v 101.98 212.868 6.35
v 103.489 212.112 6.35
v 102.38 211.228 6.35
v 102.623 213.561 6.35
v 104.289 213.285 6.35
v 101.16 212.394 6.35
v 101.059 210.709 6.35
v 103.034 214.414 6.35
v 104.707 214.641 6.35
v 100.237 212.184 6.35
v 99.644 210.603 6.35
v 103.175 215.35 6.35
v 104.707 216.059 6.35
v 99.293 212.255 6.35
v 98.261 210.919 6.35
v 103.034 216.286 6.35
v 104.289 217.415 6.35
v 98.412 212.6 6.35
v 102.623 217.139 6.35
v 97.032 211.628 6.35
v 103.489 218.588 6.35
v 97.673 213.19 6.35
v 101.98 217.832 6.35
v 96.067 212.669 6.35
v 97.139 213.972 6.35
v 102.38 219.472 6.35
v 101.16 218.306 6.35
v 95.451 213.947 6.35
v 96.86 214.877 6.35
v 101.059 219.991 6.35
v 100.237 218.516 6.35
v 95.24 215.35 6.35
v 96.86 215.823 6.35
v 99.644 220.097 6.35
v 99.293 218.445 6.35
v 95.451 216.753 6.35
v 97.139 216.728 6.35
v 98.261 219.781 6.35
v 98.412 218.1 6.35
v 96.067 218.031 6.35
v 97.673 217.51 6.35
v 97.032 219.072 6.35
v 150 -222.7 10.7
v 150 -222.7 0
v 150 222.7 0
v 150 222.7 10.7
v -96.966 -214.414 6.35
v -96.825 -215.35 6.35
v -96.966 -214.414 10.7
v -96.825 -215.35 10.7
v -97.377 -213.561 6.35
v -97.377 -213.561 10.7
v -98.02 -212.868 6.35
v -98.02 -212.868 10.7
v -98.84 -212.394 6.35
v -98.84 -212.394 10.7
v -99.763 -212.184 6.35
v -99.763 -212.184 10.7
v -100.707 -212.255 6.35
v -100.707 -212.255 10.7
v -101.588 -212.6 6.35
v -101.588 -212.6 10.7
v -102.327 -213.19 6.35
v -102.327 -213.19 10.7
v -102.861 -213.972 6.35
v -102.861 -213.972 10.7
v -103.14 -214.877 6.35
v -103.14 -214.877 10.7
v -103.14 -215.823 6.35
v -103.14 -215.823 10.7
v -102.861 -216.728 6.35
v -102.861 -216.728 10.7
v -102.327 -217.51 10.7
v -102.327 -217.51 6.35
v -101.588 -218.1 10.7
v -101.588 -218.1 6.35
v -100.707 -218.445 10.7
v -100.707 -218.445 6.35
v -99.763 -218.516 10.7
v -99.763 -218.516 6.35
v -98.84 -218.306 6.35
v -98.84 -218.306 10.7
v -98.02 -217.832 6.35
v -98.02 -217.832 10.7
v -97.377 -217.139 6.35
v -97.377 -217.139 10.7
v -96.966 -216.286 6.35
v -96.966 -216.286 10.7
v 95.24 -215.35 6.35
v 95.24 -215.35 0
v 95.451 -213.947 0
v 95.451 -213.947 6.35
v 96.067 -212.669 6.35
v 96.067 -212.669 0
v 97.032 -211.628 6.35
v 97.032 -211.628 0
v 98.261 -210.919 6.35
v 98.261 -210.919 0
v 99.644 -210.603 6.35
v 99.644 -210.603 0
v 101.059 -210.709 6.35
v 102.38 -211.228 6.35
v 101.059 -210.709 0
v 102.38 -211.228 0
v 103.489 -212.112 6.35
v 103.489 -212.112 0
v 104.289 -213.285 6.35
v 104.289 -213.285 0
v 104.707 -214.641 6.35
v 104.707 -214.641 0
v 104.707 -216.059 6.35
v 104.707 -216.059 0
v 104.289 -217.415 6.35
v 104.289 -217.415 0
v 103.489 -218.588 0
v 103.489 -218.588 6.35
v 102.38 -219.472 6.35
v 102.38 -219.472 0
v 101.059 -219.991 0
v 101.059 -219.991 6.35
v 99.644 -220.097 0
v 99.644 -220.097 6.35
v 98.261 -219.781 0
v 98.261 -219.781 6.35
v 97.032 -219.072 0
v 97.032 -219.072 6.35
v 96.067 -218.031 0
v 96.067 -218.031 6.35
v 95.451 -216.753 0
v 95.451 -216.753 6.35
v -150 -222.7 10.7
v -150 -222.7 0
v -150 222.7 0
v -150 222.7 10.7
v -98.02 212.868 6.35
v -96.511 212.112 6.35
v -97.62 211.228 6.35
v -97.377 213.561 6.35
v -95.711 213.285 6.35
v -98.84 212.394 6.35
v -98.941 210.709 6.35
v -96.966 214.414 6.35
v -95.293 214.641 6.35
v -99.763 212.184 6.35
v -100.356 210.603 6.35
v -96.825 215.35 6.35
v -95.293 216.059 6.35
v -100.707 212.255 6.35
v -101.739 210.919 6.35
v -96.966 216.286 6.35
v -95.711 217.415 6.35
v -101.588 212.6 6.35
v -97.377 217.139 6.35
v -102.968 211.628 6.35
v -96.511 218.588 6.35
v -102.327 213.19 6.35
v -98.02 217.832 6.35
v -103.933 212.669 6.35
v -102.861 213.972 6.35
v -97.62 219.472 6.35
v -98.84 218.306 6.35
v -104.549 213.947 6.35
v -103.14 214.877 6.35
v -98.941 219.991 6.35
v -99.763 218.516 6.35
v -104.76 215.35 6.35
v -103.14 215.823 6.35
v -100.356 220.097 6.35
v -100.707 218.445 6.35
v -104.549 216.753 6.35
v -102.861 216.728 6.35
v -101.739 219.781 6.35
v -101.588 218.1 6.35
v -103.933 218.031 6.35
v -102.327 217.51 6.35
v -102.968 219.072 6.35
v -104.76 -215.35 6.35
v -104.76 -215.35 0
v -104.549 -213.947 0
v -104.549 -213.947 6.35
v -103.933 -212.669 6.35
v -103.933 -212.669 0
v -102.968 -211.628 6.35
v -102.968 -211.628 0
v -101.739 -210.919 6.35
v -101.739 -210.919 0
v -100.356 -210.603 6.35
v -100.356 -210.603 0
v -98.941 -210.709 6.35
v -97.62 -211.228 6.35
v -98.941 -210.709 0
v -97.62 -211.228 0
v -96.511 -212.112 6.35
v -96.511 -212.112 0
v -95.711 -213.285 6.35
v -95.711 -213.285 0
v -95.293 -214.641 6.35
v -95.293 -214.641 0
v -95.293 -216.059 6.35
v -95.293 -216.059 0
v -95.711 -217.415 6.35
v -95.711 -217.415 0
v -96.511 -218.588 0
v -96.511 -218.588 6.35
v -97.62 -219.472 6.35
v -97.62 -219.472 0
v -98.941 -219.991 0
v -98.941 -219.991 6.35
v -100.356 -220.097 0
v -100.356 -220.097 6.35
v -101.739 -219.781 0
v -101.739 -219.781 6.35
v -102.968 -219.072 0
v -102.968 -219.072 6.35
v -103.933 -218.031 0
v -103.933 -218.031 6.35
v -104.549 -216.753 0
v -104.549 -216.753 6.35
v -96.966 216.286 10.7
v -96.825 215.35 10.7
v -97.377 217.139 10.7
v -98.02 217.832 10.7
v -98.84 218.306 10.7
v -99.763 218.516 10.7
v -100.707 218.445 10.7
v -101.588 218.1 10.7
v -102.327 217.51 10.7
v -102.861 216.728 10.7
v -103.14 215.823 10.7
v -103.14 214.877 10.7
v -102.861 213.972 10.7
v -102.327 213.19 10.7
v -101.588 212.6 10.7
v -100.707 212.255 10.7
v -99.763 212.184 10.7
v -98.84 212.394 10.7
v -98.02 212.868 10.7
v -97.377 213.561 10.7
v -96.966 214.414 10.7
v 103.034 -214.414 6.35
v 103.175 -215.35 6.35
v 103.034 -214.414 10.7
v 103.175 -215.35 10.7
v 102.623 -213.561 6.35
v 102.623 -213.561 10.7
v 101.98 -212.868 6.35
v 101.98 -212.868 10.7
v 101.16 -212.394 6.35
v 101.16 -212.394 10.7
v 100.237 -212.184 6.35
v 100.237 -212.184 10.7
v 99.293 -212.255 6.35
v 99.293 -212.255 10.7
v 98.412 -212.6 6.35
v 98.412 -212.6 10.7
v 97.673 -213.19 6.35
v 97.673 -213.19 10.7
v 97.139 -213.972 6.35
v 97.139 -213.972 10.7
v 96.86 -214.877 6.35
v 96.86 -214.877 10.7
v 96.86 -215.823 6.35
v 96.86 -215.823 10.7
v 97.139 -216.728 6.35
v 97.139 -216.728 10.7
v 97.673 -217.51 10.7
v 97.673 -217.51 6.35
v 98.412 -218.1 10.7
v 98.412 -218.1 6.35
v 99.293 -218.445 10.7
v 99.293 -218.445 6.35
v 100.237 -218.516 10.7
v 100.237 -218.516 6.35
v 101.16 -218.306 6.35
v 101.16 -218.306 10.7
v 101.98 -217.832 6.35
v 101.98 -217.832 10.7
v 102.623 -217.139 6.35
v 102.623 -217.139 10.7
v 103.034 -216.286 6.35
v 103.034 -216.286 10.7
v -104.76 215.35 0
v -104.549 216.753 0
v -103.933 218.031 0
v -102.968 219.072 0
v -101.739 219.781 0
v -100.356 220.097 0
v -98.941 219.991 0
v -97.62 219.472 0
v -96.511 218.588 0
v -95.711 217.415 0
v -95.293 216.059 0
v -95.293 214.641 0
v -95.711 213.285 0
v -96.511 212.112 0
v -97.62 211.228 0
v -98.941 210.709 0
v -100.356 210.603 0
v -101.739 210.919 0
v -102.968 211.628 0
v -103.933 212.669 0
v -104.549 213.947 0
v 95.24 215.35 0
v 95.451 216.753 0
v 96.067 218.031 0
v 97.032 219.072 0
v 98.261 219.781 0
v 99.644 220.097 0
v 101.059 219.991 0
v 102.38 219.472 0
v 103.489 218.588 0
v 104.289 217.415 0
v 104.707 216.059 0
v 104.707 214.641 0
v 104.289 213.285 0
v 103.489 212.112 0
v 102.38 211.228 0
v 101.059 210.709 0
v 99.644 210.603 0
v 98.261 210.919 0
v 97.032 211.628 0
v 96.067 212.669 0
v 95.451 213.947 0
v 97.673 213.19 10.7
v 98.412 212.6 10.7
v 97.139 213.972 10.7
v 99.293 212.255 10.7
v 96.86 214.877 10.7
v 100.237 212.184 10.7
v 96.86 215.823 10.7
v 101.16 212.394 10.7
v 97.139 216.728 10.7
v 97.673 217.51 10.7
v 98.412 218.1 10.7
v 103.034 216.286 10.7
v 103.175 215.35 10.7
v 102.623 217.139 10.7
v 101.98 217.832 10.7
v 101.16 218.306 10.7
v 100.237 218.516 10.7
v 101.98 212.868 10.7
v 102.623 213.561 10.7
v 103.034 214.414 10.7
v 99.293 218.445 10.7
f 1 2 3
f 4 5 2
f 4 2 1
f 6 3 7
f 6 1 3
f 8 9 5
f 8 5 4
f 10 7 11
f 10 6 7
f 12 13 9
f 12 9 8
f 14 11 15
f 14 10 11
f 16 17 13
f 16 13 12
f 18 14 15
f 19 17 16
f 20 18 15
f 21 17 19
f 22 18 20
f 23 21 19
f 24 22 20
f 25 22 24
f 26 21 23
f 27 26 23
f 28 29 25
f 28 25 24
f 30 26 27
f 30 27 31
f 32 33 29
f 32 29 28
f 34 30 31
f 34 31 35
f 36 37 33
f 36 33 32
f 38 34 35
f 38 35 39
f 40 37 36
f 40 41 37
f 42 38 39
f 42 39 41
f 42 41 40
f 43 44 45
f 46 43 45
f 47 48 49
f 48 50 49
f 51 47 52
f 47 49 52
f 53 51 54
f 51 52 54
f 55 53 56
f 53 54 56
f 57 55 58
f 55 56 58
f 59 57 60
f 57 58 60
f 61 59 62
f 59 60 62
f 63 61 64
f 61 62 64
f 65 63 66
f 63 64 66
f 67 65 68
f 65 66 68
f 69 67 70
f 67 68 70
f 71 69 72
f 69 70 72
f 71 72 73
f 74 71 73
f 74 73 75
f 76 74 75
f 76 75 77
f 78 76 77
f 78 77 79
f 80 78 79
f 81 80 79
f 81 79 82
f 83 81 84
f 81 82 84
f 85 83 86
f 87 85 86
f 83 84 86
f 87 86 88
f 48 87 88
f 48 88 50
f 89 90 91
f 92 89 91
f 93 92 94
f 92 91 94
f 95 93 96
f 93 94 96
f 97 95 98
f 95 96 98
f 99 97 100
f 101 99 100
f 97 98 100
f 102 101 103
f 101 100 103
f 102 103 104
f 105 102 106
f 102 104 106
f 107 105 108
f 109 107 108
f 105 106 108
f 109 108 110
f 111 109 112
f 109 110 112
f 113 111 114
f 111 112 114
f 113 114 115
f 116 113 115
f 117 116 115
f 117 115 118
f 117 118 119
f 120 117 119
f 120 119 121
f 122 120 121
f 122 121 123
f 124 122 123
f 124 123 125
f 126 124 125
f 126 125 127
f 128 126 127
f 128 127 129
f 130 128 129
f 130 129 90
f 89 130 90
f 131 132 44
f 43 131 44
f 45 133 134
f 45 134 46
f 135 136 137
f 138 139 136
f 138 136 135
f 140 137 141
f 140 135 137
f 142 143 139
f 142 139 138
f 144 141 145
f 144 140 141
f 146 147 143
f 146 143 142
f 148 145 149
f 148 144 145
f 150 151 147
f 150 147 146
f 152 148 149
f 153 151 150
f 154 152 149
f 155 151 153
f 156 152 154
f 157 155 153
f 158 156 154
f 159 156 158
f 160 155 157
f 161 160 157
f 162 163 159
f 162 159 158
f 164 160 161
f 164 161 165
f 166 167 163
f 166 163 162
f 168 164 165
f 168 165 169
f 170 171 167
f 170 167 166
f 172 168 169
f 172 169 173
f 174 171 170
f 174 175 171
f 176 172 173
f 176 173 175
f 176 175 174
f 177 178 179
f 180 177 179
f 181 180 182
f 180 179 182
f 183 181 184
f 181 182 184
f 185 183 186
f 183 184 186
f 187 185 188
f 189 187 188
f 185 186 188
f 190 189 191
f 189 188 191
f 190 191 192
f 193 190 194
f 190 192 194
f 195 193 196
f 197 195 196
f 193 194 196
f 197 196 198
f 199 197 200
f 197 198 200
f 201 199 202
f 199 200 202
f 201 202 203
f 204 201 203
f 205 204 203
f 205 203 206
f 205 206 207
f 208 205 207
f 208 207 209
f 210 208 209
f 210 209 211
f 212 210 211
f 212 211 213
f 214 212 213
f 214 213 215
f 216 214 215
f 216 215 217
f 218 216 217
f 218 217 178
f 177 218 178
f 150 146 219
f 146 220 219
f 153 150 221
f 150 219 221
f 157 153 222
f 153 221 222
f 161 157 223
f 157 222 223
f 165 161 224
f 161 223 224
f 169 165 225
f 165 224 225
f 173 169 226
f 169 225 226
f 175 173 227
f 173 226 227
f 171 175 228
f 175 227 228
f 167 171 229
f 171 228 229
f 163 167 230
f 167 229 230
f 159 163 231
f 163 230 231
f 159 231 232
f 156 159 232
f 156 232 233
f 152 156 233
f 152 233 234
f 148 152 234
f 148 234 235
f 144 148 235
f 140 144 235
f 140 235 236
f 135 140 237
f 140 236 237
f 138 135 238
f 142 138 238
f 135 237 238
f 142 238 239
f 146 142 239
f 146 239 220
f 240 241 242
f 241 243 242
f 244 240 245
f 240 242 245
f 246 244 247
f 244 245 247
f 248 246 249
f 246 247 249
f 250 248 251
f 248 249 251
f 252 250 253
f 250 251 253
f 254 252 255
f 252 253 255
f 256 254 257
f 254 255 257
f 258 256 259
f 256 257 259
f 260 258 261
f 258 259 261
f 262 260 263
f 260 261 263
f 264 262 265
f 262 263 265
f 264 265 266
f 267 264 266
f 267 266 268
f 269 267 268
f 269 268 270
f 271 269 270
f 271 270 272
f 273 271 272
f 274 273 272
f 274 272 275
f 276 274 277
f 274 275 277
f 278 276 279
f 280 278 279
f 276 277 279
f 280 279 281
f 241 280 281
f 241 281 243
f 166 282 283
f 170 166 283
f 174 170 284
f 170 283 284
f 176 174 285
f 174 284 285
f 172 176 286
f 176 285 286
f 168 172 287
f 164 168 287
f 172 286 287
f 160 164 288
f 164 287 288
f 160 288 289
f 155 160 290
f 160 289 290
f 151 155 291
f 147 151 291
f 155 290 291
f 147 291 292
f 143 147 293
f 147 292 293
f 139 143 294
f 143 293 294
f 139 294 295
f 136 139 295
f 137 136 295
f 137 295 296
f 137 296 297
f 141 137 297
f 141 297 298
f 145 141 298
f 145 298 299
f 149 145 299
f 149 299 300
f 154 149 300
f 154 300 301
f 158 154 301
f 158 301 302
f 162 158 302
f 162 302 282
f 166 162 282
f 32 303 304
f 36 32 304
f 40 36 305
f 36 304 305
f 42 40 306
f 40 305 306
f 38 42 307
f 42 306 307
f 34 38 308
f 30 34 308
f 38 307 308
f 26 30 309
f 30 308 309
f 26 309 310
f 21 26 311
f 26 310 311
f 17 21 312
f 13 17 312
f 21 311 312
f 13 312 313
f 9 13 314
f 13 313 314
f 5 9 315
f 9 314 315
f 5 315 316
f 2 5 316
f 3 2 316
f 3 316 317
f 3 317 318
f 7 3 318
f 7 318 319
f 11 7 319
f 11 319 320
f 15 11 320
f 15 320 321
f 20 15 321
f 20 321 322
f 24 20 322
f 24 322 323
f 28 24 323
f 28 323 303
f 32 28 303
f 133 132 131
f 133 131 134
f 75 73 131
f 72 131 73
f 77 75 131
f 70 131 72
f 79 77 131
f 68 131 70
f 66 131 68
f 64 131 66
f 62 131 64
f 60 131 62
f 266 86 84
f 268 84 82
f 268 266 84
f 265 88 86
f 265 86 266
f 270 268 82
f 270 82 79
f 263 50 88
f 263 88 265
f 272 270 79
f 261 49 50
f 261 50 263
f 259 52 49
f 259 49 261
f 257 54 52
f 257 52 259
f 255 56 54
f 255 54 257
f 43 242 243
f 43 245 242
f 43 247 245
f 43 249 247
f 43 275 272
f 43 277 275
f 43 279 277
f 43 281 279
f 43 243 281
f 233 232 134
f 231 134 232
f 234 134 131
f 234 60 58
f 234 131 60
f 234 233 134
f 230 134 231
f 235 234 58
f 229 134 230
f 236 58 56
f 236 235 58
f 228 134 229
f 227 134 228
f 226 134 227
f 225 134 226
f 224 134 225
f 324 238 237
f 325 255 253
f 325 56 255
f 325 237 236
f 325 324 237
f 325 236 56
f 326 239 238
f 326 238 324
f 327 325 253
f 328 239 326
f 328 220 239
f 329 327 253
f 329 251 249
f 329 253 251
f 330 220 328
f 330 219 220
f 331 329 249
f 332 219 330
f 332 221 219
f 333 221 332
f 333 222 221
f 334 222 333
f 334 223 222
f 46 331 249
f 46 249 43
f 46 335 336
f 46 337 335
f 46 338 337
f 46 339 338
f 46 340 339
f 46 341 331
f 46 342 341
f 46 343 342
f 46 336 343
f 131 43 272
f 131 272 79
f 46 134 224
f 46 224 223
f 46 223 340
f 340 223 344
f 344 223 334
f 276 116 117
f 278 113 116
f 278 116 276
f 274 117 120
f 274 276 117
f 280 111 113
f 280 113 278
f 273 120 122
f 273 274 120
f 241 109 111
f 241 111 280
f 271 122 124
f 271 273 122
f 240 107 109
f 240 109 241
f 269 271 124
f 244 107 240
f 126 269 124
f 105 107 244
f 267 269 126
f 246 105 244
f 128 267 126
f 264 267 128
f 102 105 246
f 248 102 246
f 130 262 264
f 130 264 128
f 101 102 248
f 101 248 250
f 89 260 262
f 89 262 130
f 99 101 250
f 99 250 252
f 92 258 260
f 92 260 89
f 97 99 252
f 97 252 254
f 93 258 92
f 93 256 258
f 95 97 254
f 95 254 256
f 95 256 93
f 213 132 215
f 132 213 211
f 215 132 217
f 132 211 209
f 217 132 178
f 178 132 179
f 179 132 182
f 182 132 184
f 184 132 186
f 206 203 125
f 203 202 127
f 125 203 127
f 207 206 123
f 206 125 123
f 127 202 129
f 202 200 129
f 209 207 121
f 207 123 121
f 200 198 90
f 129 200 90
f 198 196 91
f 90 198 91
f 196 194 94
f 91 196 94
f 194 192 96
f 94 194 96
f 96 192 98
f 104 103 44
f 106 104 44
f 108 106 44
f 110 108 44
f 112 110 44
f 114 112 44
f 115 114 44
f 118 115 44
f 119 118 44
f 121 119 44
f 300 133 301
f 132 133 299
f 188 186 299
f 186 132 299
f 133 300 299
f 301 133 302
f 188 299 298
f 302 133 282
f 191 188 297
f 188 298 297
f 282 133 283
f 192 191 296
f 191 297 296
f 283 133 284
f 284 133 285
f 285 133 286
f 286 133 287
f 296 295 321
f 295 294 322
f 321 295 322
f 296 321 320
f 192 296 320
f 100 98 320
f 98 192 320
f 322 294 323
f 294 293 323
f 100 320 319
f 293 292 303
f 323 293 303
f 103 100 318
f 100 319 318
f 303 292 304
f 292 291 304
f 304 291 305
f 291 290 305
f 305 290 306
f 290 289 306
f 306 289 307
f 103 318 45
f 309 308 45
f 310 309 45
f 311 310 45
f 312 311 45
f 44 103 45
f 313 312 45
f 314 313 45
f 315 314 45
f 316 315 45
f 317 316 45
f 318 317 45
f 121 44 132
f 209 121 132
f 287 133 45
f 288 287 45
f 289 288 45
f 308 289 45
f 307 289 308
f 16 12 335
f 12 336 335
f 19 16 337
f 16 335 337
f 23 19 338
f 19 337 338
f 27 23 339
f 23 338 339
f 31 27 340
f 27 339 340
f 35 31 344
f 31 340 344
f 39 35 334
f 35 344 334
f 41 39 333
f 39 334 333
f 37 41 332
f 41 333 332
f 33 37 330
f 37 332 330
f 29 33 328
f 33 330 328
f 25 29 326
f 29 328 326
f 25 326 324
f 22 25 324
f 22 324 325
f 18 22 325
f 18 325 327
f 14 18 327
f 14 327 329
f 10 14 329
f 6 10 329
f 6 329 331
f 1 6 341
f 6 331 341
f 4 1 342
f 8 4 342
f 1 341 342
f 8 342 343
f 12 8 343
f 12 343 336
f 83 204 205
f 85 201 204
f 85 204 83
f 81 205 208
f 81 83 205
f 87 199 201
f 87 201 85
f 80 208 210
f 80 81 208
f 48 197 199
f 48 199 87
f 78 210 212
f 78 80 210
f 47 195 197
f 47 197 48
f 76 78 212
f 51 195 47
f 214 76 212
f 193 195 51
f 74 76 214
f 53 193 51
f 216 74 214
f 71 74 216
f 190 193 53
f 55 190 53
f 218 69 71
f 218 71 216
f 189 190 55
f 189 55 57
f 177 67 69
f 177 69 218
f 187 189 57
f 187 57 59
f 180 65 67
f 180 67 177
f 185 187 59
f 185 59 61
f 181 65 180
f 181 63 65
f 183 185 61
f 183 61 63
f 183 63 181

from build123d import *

# Parameters (mm, degrees)
ESBO_O1_W                = 300
ESBO_O1_H                = 445.4
RESSALTO_EXTRUS_O1_DEPTH = 10.7
FURO1_D                  = 6.35
FURO1_CBORE_D            = 9.52
FURO1_CBORE_DEPTH        = 6.35


with BuildPart() as part:
    # Esboço1 → Ressalto-extrusão1 (new body)
    with BuildSketch(Plane.XY):
        Rectangle(ESBO_O1_W, ESBO_O1_H)
    extrude(amount=RESSALTO_EXTRUS_O1_DEPTH)

    # Furo1 (through all)
    with Locations(Plane(origin=(0, 0, 0), x_dir=(-1, 0, 0), z_dir=(0, 0, -1))):
        with Locations((-100, 215.35), (-100, -215.35), (100, -215.35), (100, 215.35)):
            CounterBoreHole(FURO1_D / 2, FURO1_CBORE_D / 2, FURO1_CBORE_DEPTH)


solid = part.part
